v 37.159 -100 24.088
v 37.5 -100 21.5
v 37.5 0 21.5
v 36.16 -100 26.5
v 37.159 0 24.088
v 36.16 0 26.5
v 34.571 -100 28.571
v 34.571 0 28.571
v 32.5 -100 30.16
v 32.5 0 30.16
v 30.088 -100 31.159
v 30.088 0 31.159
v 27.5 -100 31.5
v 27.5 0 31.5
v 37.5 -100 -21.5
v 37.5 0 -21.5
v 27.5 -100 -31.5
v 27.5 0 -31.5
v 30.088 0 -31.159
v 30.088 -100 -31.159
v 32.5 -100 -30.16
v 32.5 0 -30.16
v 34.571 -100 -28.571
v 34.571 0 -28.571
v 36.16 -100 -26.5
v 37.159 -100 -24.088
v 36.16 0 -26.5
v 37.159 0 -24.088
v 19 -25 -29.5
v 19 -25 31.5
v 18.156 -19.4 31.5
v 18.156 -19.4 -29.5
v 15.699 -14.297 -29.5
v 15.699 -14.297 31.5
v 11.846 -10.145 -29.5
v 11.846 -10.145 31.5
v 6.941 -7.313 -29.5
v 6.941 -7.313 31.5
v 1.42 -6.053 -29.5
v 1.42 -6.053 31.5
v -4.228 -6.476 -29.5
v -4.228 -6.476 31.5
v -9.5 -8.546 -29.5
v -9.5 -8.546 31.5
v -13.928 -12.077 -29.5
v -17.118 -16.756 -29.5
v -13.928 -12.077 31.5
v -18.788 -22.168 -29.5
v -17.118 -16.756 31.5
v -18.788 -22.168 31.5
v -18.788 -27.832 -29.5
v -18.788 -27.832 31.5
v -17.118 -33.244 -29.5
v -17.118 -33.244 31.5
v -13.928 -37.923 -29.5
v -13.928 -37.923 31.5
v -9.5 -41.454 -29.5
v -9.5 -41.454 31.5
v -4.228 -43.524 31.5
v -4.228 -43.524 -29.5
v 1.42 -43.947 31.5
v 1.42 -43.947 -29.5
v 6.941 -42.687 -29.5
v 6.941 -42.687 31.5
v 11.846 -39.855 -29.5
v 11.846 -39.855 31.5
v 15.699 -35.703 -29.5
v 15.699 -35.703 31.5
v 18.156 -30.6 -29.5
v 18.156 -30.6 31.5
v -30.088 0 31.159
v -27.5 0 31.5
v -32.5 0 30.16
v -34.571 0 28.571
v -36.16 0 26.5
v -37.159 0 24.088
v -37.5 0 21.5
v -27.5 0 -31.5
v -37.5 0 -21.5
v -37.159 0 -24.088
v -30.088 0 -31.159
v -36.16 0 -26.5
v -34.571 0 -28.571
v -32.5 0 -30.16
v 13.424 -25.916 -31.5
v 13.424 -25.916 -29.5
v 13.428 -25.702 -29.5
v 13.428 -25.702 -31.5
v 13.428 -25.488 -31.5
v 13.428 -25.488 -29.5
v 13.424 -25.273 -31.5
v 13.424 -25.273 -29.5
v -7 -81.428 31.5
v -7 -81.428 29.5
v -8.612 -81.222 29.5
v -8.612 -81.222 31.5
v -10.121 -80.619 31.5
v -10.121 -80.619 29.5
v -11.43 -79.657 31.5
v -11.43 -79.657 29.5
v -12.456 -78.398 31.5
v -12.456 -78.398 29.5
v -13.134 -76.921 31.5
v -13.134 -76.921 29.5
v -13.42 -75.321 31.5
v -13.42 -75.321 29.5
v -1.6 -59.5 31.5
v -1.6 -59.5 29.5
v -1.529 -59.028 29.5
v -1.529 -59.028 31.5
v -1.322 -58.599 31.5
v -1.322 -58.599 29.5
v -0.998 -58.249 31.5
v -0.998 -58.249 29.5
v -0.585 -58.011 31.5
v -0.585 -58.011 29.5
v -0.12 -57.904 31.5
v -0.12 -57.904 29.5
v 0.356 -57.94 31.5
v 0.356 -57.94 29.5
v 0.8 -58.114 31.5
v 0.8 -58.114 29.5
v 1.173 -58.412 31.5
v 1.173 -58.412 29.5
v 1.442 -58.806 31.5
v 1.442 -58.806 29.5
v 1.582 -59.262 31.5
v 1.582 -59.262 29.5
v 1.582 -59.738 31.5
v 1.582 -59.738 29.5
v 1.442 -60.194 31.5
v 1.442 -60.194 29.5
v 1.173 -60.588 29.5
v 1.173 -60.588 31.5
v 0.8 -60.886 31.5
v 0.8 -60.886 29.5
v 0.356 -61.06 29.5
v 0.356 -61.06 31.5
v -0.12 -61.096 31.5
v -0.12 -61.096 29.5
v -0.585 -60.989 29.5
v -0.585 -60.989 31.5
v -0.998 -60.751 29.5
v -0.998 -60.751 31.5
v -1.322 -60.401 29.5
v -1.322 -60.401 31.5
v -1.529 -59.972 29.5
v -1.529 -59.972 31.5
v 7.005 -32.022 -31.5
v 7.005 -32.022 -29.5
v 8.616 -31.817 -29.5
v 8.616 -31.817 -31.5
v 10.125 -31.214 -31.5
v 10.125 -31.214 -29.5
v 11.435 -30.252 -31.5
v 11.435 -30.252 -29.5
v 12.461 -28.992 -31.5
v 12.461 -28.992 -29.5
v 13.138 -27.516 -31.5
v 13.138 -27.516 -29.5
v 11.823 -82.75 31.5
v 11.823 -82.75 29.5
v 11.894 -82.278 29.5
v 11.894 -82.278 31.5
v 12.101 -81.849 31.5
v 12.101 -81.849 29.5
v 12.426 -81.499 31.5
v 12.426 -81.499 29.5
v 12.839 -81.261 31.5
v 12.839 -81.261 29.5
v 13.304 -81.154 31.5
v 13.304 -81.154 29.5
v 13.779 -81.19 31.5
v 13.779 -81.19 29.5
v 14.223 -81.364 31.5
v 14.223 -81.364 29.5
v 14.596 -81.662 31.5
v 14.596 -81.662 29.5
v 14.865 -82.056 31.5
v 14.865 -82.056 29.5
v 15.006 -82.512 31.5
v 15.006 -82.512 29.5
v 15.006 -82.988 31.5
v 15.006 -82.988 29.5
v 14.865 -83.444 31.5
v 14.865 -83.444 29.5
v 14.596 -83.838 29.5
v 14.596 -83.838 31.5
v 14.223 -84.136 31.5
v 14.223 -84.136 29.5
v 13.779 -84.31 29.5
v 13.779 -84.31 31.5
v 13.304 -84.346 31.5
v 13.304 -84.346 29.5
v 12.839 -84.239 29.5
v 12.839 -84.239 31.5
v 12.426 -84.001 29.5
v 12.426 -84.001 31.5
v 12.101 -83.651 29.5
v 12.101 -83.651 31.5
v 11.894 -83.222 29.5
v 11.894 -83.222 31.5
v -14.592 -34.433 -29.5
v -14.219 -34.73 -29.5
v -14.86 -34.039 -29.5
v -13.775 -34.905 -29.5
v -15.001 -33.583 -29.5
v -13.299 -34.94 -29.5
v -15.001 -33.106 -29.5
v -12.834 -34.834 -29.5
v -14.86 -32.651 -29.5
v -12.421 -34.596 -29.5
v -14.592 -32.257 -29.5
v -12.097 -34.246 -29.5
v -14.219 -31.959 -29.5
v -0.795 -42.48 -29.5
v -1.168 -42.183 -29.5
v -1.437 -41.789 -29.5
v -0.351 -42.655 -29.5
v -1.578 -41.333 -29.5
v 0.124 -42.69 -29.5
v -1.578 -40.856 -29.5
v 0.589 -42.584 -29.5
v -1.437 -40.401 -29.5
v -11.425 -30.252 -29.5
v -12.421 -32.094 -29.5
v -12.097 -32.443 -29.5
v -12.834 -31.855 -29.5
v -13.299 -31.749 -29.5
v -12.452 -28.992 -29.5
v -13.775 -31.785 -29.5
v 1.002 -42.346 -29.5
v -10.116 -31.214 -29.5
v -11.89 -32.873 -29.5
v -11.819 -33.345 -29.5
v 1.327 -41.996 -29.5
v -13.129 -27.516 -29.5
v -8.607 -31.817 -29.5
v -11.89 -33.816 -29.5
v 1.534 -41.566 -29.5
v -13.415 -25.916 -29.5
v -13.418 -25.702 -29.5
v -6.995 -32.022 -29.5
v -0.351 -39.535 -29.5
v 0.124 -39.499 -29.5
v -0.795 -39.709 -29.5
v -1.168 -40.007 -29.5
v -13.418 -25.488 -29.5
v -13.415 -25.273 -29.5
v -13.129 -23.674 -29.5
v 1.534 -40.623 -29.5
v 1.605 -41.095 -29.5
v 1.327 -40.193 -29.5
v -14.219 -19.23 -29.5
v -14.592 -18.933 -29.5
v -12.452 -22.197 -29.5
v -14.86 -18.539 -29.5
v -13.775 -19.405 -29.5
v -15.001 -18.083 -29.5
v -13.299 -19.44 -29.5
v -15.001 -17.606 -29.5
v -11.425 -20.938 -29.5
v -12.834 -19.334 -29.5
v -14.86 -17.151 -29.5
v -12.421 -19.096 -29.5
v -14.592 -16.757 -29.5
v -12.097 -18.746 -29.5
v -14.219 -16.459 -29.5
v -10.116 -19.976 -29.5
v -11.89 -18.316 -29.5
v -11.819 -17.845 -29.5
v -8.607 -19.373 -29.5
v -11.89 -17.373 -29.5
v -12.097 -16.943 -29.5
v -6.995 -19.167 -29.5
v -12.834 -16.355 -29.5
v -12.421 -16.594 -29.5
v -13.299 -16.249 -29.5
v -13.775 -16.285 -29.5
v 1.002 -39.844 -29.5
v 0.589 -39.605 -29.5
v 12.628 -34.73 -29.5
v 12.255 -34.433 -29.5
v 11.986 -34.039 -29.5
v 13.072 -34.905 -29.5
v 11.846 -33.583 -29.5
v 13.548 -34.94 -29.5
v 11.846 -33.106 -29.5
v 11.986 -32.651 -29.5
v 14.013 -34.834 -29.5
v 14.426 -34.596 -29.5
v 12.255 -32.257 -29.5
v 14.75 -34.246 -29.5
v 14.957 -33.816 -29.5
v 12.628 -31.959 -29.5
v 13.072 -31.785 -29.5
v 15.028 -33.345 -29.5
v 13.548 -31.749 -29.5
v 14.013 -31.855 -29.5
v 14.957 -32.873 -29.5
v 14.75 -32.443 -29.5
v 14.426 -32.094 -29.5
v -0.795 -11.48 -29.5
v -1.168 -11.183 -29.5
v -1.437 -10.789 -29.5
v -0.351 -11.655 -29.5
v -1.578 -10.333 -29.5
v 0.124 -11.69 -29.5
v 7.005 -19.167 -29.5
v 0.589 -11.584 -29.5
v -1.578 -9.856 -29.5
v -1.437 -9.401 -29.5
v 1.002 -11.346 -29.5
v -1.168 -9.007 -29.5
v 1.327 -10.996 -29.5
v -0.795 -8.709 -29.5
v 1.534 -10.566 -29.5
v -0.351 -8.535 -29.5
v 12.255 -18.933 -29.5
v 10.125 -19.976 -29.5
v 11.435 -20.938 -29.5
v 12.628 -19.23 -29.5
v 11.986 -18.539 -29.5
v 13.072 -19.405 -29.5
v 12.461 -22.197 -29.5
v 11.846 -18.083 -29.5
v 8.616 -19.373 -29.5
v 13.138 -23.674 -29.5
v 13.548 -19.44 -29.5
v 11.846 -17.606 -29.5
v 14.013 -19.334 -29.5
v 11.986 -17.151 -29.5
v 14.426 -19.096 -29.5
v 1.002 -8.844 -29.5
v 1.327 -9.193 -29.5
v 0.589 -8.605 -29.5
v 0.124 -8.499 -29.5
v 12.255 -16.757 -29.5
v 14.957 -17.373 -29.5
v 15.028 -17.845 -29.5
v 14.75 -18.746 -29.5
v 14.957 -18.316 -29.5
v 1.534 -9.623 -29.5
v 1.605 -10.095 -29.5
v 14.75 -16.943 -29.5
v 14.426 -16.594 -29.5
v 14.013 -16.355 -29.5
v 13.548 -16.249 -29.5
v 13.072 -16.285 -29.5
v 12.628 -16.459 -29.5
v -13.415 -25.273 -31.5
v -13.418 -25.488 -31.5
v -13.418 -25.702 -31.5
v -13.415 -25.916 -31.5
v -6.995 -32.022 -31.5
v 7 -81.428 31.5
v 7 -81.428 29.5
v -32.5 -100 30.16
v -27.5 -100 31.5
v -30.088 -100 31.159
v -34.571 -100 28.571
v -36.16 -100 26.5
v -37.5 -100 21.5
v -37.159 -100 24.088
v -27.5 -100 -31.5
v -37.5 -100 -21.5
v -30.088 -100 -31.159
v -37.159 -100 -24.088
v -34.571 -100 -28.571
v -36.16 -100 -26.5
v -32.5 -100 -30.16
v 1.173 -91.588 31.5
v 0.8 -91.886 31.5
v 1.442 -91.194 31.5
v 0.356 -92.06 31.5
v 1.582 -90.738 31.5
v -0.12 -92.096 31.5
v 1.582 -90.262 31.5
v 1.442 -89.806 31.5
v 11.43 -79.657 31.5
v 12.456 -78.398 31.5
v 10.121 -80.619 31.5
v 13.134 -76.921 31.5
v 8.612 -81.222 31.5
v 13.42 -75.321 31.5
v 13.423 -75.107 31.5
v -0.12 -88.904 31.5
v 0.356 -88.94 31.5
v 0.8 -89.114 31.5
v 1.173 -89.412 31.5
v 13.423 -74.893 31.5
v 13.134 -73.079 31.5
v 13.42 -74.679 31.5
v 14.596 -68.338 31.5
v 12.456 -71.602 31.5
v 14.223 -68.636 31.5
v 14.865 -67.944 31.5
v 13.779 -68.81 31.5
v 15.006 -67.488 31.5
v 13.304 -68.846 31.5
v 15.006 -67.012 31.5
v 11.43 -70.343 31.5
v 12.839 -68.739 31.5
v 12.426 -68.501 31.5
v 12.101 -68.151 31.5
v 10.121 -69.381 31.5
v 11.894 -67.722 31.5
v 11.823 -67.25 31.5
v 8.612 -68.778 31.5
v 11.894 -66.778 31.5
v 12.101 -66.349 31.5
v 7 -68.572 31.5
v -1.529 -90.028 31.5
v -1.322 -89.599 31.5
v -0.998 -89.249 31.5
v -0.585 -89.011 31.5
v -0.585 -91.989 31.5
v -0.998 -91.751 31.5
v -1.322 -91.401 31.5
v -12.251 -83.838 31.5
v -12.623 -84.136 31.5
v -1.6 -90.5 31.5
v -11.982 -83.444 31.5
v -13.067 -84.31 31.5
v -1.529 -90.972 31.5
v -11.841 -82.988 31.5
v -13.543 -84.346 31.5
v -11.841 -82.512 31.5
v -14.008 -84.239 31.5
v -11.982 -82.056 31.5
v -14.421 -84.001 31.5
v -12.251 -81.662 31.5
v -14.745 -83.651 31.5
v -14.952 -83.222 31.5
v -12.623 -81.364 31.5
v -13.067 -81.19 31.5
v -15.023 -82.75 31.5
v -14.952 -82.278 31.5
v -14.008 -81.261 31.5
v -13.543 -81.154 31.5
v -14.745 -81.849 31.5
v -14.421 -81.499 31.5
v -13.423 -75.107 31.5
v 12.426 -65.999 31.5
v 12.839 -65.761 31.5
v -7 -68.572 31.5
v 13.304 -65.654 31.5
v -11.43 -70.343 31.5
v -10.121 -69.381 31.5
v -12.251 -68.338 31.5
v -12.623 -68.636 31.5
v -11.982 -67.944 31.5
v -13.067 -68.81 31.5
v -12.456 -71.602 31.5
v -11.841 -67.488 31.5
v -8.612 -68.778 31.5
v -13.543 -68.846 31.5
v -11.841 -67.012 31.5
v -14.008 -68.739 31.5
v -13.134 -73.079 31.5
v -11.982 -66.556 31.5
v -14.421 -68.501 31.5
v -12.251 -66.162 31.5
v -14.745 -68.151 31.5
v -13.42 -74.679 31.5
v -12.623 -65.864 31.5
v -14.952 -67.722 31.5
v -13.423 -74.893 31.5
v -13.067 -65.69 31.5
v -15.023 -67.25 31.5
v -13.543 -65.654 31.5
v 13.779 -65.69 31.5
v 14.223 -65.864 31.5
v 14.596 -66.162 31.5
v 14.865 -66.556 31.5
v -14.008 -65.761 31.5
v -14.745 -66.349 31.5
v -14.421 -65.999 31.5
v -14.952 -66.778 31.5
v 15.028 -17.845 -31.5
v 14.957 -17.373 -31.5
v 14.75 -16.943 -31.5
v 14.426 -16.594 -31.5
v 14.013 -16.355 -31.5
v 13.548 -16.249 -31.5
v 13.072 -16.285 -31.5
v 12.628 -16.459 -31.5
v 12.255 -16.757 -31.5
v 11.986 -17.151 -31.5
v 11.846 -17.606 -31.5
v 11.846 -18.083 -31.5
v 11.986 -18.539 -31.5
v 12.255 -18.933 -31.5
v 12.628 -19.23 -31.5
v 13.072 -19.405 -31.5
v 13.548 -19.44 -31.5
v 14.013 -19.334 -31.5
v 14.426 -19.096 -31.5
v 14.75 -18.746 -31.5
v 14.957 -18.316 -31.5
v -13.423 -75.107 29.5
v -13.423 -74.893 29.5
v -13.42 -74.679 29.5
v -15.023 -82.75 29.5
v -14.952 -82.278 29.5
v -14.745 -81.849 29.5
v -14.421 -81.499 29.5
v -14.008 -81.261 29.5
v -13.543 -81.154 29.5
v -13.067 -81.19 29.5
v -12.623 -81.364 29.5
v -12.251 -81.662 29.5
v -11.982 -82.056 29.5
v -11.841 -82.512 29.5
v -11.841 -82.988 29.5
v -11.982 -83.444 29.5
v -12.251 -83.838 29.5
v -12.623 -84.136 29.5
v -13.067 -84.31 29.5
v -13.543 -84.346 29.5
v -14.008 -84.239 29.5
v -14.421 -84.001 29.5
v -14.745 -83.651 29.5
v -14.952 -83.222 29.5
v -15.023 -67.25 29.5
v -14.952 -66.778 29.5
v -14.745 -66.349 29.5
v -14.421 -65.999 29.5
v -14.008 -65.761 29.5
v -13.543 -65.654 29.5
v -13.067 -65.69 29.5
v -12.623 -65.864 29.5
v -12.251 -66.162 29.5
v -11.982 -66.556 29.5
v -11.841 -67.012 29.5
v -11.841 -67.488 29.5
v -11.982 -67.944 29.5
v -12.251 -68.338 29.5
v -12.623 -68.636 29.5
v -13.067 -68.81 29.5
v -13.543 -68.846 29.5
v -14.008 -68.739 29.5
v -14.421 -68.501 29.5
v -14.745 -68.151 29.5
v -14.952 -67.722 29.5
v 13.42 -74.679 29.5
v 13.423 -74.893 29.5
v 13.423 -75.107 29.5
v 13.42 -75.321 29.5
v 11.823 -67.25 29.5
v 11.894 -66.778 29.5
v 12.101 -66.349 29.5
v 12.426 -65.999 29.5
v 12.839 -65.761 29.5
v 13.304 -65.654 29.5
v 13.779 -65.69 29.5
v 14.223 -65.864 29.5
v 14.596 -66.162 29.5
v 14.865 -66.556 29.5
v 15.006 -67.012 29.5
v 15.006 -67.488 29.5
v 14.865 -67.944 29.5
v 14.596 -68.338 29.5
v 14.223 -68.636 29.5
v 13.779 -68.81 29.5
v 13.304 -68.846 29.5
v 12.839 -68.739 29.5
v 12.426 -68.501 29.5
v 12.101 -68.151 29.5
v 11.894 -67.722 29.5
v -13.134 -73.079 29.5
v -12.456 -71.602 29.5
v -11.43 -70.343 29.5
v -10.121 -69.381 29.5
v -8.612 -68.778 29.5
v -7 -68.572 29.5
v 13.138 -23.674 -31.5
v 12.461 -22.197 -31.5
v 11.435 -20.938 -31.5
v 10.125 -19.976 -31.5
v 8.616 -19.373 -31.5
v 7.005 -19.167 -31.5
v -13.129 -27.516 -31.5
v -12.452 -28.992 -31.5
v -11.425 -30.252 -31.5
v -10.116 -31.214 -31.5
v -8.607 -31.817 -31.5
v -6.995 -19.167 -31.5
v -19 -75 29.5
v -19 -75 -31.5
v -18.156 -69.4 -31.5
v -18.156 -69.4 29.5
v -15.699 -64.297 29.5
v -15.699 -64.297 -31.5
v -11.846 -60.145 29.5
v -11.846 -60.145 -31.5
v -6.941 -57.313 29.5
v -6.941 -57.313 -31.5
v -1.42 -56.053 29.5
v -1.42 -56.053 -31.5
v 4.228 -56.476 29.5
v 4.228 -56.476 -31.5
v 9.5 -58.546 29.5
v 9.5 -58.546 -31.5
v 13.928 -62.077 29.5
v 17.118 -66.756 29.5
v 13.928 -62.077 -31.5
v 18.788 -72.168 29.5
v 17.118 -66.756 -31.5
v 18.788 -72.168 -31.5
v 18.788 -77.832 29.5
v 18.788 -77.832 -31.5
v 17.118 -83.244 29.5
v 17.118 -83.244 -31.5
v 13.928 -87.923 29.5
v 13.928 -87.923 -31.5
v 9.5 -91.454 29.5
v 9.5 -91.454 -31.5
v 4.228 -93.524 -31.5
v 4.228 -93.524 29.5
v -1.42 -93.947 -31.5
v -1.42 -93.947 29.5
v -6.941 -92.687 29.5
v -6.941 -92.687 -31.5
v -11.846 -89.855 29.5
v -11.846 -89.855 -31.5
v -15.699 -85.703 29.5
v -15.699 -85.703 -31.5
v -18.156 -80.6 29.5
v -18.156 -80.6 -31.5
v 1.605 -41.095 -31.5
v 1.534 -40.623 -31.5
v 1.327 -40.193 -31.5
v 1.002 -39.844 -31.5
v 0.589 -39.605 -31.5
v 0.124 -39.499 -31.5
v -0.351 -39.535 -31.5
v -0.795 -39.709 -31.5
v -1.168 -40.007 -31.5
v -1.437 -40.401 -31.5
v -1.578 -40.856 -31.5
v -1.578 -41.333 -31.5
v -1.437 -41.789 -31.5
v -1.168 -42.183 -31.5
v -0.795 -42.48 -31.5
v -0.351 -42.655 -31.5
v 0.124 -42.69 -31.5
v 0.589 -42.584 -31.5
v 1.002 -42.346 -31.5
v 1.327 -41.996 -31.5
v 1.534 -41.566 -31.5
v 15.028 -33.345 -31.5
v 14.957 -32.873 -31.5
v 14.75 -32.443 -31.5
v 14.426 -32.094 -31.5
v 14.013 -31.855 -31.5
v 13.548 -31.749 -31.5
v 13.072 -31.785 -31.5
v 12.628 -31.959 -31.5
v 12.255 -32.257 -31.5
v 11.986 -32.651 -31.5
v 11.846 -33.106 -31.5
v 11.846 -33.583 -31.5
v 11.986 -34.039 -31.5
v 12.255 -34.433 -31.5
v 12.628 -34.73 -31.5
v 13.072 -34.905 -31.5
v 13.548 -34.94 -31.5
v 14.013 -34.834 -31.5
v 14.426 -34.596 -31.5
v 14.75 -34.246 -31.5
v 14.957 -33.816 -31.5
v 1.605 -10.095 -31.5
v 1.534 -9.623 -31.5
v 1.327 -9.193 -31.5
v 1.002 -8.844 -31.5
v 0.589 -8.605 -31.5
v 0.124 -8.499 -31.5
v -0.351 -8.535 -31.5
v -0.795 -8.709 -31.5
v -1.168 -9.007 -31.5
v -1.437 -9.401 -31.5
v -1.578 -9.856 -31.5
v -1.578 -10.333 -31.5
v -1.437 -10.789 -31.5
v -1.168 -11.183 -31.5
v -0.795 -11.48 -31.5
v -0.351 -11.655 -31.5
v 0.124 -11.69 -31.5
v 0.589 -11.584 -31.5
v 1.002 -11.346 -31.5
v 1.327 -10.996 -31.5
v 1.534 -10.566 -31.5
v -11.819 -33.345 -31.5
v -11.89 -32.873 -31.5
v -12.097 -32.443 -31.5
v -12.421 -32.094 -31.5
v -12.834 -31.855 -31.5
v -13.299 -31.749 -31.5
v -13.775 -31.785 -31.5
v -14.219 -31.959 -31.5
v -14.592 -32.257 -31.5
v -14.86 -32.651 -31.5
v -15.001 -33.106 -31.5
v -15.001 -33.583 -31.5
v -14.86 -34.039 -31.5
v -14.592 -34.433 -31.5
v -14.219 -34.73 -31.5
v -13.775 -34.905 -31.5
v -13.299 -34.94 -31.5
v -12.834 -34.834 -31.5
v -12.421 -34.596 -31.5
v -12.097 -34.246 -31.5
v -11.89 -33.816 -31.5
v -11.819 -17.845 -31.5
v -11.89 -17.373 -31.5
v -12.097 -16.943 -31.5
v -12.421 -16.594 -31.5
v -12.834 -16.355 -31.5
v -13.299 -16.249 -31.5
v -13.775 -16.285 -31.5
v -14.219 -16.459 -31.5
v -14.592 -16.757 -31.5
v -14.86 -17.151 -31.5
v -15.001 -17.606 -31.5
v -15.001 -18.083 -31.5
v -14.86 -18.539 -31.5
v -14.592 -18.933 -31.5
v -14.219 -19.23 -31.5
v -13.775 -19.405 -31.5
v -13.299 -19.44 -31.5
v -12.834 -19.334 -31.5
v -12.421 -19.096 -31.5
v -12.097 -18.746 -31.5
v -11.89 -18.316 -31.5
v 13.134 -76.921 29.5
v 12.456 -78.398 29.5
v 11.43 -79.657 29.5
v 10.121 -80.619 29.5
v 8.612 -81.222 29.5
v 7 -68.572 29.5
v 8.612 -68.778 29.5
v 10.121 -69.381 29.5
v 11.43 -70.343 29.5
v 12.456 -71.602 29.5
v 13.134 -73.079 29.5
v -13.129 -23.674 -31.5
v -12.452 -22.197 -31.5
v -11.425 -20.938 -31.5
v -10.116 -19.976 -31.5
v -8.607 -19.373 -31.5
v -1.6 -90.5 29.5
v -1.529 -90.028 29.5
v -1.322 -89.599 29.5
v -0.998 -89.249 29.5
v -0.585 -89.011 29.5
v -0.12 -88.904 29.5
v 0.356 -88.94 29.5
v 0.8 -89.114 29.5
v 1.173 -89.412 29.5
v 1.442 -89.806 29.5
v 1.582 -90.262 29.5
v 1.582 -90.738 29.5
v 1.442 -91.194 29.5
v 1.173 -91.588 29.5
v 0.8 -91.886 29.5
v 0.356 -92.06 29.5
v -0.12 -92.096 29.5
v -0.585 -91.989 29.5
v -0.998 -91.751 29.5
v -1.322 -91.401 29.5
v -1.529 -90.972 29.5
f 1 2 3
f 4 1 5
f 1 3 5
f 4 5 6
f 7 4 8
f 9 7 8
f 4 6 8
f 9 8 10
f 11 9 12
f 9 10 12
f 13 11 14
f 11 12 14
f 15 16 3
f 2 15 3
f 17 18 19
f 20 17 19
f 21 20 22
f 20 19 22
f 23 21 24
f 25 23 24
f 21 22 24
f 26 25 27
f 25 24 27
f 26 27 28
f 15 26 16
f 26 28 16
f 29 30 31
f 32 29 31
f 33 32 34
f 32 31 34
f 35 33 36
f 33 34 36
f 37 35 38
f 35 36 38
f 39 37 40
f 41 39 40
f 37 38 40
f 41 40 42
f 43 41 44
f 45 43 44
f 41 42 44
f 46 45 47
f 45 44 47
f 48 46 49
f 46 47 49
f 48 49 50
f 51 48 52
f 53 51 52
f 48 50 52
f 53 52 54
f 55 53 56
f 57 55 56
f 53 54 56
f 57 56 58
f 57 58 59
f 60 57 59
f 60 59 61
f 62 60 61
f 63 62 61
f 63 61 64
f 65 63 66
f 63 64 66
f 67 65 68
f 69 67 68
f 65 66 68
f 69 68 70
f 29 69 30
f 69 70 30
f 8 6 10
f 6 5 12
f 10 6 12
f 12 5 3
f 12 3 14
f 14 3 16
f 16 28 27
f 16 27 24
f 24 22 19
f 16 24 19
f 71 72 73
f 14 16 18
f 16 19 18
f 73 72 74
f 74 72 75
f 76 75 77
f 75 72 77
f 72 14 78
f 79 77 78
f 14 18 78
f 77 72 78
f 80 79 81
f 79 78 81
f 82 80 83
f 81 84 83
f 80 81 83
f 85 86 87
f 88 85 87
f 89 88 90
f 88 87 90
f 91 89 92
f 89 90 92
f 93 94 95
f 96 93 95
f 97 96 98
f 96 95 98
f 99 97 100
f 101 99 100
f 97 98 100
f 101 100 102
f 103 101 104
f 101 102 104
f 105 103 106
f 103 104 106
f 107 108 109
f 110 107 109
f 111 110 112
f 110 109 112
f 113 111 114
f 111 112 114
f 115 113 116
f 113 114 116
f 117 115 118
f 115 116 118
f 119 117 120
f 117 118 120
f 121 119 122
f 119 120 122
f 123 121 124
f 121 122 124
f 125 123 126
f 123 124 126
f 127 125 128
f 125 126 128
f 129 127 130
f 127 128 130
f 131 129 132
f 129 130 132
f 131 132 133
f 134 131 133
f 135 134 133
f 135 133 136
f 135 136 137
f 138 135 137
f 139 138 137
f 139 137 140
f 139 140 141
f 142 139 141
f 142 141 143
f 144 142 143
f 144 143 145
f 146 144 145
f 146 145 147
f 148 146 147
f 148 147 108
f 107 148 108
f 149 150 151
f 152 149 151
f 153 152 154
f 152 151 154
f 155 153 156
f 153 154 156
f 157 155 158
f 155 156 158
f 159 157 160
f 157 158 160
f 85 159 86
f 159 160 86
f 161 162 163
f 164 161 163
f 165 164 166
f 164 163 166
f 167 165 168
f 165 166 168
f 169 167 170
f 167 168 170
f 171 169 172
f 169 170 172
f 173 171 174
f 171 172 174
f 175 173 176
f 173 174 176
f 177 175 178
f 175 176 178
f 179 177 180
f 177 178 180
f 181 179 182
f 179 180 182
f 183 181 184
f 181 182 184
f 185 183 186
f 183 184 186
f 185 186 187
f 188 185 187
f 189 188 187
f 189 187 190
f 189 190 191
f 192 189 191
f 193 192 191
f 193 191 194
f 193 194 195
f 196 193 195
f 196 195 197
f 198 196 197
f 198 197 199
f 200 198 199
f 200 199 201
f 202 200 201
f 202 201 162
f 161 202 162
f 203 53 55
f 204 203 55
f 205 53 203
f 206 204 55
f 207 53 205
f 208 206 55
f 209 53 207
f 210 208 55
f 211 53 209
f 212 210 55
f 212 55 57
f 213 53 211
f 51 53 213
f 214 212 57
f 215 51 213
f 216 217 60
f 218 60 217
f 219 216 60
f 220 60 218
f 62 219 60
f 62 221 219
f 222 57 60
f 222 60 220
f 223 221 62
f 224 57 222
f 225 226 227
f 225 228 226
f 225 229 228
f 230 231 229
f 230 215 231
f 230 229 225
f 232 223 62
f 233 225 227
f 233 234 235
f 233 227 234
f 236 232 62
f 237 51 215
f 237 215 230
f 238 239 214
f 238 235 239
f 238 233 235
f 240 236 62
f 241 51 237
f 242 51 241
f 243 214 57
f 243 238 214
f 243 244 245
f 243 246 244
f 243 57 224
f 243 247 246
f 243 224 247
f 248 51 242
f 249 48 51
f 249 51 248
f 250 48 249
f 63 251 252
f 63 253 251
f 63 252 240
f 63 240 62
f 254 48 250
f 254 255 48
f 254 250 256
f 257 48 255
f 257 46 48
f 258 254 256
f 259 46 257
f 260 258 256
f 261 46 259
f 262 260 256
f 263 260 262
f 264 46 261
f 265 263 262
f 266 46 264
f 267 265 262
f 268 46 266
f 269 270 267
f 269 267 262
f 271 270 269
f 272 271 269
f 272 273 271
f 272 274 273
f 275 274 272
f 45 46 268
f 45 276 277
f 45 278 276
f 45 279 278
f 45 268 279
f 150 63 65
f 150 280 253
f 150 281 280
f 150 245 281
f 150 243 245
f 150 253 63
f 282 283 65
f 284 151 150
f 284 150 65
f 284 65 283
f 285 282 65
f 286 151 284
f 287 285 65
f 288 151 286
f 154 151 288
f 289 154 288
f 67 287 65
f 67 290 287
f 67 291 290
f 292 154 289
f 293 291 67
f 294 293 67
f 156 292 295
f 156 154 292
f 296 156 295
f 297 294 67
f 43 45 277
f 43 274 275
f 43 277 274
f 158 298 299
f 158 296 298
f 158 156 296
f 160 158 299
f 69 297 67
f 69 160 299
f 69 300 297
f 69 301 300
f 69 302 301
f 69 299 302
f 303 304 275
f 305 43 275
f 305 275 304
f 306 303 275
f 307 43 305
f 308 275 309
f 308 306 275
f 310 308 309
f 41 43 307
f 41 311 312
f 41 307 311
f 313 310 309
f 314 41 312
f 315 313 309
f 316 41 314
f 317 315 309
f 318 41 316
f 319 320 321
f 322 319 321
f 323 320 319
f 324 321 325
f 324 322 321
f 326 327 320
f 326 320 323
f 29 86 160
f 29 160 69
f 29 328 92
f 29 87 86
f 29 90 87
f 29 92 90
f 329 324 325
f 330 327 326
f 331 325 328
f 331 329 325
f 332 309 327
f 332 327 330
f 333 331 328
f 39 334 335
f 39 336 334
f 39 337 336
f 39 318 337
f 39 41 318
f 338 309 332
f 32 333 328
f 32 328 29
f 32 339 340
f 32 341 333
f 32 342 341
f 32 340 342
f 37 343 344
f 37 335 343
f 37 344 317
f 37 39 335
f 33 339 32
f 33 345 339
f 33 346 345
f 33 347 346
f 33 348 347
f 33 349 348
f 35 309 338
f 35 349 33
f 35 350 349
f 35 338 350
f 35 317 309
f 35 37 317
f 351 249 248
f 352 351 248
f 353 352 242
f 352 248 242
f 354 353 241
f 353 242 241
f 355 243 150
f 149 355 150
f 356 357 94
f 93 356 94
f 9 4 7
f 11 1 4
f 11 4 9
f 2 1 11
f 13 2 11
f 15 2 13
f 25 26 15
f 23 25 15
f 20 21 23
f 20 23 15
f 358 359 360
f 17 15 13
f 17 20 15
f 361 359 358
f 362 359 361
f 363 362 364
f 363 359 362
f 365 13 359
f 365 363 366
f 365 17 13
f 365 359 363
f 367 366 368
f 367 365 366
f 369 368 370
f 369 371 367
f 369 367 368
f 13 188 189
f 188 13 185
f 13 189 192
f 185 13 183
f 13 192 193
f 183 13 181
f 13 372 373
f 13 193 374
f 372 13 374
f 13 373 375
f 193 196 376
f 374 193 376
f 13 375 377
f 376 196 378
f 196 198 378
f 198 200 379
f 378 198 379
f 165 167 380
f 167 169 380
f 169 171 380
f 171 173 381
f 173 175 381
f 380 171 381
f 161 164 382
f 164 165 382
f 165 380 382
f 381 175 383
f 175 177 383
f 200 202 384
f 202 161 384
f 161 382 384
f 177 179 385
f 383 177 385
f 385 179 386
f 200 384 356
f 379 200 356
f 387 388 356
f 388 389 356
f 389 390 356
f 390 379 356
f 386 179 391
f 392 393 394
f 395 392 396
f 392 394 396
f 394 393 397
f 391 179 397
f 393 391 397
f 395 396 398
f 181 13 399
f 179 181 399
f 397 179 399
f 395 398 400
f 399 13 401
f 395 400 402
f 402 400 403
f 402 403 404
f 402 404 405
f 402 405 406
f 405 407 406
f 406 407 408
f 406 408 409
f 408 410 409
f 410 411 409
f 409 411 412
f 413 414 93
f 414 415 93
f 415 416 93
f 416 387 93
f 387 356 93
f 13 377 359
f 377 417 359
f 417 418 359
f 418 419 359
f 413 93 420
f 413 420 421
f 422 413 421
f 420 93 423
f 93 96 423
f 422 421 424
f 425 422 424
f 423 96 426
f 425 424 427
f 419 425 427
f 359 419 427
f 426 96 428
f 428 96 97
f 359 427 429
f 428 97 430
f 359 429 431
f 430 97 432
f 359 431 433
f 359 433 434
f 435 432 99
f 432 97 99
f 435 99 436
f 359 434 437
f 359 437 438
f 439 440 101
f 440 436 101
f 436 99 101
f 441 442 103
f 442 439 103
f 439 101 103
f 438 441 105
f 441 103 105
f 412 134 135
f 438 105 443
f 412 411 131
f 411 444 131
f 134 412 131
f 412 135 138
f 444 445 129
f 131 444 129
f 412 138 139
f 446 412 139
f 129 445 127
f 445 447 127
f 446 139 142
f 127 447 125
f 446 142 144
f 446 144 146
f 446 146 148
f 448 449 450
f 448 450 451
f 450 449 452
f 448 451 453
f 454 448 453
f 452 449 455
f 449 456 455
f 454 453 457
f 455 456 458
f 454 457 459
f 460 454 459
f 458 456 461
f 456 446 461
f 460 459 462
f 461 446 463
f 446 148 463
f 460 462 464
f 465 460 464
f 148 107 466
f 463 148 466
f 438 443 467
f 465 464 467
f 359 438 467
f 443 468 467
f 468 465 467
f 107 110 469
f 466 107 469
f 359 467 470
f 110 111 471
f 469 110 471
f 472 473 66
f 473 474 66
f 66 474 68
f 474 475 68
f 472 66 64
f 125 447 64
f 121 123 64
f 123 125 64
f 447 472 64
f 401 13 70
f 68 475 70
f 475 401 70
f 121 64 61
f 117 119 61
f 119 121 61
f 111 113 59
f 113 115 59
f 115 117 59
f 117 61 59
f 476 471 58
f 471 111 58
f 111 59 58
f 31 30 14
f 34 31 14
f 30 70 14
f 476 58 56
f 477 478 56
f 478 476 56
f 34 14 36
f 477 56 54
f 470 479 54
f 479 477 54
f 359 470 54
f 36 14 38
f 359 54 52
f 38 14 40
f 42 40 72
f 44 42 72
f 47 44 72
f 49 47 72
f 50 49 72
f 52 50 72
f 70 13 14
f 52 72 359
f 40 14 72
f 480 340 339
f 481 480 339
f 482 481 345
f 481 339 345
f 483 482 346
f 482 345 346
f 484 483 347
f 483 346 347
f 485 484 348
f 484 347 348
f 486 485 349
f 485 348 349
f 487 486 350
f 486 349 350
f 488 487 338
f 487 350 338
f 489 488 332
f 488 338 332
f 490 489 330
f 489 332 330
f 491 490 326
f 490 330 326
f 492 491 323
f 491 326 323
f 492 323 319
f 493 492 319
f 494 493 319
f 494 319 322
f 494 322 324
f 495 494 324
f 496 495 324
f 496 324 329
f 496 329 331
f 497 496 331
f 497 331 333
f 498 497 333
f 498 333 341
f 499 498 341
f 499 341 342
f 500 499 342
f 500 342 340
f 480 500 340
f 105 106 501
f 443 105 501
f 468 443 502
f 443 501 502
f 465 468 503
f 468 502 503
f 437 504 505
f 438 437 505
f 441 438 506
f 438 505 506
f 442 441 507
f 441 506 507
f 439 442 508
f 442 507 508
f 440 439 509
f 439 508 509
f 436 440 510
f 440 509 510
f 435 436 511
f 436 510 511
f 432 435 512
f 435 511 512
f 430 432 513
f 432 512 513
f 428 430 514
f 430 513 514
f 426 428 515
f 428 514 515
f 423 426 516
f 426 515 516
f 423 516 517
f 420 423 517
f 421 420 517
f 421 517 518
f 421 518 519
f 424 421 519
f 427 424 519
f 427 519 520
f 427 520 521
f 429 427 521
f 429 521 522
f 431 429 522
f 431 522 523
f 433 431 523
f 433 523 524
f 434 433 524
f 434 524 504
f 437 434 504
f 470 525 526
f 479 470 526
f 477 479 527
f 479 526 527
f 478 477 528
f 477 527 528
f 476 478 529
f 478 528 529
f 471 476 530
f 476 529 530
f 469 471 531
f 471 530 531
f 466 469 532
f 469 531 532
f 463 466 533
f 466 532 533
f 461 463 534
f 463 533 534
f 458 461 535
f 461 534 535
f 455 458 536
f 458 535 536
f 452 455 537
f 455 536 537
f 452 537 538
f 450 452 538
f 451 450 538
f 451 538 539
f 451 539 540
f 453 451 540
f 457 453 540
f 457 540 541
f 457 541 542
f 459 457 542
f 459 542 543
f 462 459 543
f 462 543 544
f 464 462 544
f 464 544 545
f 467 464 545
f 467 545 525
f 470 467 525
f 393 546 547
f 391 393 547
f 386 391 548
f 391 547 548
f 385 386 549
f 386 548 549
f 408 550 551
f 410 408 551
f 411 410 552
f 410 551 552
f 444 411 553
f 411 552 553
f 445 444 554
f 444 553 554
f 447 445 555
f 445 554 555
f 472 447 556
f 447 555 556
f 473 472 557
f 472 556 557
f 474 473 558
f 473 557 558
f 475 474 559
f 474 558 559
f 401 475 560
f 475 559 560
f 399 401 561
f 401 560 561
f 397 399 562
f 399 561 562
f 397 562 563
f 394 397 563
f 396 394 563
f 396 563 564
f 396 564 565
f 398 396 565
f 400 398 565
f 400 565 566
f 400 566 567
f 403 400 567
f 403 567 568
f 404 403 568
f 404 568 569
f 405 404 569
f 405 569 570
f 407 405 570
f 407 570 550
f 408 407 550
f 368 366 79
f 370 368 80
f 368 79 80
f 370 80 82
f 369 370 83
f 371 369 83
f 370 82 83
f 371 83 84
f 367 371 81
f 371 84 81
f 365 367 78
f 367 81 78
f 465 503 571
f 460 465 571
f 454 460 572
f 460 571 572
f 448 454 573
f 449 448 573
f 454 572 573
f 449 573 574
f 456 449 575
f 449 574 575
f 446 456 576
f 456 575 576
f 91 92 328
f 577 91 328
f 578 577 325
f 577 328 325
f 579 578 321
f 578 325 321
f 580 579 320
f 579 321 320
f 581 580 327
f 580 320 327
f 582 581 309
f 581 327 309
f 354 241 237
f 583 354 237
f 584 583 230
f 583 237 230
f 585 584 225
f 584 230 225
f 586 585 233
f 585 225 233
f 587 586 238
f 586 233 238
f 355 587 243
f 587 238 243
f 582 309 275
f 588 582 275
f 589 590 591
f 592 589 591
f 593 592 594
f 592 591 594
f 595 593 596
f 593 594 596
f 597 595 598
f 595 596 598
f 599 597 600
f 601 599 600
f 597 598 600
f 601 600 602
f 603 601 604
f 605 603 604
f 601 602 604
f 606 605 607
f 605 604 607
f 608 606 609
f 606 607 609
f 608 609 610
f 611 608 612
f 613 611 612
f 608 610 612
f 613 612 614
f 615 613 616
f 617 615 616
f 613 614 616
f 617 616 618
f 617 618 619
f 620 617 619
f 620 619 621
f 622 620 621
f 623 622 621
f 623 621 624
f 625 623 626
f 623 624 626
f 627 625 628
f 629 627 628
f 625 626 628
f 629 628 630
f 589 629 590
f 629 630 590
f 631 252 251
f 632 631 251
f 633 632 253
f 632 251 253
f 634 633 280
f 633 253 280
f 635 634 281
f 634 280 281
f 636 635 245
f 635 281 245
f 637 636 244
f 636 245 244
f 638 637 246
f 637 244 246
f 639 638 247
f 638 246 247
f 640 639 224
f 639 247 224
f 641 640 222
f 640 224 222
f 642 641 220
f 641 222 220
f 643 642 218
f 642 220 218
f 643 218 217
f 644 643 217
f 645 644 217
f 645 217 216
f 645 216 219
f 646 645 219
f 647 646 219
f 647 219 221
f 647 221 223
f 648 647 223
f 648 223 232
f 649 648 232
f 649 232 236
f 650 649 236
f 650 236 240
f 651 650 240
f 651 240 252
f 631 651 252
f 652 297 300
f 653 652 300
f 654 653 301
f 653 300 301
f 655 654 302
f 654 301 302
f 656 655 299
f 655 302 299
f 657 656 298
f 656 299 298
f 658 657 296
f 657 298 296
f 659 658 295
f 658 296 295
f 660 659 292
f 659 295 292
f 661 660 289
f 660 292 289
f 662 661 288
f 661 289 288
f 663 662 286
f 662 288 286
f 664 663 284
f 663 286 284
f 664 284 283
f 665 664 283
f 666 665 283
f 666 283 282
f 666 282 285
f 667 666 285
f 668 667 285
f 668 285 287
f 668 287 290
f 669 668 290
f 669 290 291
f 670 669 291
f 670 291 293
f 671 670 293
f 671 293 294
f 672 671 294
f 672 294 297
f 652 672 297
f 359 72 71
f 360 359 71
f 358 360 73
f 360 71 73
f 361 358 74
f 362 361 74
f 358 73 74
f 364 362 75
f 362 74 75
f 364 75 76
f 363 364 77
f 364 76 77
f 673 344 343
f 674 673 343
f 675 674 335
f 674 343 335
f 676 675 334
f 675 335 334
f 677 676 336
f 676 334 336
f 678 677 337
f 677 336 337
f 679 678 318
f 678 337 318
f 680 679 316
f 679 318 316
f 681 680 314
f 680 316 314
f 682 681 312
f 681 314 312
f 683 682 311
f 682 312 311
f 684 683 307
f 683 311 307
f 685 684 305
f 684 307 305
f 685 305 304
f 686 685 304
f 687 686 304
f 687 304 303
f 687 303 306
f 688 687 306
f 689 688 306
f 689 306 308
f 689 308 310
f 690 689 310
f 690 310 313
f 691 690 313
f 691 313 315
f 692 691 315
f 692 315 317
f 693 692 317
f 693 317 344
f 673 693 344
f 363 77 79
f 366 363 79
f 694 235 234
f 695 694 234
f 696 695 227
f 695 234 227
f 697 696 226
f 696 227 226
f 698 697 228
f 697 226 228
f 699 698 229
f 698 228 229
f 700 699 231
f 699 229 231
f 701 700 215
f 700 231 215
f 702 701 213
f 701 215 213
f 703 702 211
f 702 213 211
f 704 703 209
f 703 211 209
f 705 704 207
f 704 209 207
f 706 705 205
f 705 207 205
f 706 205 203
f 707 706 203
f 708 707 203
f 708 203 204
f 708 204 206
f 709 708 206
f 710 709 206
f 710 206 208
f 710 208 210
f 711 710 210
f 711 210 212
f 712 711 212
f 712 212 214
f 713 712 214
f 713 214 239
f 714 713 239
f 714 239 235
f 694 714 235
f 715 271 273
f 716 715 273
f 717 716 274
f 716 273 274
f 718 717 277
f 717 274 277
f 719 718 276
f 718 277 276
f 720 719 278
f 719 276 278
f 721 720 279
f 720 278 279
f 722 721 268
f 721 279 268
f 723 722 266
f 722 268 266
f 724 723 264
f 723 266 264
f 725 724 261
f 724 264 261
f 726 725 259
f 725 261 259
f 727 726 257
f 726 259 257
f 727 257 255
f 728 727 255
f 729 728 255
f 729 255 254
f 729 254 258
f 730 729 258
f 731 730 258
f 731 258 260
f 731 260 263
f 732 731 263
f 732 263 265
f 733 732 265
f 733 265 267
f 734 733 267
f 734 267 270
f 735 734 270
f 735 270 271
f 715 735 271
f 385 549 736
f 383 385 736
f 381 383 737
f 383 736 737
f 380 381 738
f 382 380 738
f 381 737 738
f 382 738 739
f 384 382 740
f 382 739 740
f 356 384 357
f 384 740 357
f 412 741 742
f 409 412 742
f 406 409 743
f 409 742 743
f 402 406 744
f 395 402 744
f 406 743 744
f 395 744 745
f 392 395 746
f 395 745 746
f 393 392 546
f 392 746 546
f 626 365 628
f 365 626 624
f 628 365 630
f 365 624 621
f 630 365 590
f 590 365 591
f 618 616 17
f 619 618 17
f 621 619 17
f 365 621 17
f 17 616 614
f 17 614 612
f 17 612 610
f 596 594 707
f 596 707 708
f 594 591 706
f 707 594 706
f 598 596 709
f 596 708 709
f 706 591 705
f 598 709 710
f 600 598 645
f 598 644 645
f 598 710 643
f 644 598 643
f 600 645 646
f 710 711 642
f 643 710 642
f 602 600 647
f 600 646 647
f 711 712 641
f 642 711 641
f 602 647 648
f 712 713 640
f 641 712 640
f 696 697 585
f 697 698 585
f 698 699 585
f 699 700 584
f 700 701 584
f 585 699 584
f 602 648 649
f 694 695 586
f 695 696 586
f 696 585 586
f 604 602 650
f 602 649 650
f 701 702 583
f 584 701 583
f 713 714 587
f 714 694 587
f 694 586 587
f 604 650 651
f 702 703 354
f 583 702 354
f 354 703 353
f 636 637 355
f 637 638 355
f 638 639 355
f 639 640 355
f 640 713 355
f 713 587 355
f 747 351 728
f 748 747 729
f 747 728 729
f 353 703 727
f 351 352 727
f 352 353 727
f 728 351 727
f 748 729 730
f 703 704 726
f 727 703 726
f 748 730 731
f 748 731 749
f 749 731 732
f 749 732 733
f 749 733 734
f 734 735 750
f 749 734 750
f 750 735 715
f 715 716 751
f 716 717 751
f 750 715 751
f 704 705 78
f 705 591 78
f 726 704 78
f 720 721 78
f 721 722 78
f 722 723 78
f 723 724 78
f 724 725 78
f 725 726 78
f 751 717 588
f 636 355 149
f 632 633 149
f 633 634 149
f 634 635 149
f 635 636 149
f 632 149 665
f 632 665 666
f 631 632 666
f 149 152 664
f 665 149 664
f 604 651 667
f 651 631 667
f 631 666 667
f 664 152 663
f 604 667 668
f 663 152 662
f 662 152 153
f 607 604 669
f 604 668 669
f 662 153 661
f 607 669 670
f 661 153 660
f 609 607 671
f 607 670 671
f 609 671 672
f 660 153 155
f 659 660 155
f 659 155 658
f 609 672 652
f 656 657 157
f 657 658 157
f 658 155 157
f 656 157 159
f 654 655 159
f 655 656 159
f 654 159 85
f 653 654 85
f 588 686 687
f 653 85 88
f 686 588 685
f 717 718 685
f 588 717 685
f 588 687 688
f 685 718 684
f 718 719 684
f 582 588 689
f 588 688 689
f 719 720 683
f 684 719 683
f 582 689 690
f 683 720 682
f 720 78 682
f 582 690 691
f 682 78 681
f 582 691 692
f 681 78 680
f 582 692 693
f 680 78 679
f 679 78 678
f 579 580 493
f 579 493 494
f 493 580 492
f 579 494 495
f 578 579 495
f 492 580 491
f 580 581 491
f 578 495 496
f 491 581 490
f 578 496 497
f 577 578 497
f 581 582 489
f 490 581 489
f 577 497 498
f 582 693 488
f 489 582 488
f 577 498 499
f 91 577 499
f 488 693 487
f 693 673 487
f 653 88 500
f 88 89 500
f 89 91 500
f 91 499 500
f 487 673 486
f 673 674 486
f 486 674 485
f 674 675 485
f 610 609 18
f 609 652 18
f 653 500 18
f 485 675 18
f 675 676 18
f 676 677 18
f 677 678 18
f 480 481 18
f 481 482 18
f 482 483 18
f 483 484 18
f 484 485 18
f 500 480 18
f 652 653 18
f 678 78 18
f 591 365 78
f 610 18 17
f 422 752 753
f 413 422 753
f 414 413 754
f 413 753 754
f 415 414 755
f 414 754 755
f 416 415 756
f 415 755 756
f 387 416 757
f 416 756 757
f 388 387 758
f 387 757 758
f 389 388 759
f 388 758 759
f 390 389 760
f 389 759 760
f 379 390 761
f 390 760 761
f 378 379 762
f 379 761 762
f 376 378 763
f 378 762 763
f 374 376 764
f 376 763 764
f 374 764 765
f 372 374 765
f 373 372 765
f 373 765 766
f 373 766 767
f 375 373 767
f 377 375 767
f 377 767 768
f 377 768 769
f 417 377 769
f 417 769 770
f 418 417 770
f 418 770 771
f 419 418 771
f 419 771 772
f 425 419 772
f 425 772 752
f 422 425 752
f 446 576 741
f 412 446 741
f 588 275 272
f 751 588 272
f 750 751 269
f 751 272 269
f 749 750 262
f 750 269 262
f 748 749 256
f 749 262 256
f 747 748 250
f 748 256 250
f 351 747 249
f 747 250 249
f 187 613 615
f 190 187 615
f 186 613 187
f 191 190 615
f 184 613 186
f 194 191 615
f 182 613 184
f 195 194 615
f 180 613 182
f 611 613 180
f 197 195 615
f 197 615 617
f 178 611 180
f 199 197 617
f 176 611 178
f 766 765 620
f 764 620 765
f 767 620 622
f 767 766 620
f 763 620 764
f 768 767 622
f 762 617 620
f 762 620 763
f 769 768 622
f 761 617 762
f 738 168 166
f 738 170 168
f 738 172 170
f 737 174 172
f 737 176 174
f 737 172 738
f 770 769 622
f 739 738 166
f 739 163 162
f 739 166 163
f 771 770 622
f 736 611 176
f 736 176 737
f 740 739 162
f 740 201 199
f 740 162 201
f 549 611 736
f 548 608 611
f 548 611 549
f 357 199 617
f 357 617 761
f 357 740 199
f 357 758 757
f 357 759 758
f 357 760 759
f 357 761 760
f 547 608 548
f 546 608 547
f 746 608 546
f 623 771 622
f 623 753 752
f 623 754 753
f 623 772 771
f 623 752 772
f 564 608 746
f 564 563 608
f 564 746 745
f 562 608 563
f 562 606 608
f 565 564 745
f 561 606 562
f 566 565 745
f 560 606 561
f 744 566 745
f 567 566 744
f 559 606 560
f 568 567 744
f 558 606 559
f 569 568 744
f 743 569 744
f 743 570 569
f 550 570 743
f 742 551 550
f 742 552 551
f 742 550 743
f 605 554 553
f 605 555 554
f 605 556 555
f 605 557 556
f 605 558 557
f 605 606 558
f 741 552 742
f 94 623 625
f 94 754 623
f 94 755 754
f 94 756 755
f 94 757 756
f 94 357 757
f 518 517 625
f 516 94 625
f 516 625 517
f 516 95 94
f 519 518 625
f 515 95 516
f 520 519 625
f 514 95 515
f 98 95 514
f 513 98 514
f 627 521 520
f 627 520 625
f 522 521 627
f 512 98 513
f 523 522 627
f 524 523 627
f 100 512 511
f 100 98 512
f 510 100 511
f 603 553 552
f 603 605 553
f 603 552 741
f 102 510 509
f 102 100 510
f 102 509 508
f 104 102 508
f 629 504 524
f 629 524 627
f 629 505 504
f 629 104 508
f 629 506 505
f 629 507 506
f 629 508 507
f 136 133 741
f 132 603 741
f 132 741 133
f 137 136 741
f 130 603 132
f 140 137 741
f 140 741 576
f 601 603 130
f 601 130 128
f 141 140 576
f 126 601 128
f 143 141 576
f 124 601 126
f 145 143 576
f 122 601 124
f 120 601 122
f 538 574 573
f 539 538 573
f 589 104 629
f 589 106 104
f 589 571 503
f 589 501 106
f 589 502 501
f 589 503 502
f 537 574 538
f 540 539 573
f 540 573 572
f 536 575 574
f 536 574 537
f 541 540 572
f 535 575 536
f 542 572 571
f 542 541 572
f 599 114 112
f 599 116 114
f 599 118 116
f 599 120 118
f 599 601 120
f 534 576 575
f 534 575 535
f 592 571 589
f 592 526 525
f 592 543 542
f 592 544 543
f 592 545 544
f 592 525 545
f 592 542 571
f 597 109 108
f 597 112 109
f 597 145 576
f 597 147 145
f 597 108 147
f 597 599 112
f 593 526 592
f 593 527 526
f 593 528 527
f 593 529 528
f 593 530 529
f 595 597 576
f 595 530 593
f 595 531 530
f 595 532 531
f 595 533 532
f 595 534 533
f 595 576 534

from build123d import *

# Parameters (mm, degrees)
EXTRUDE_1_DEPTH      = 100
SKETCH_4_R           = 1.6
CUT_EXTRUDE_7_DEPTH  = 124.99697577
SKETCH_7_R           = 19
CUT_EXTRUDE_8_DEPTH  = 61
SKETCH_3_R           = 1.6
CUT_EXTRUDE_9_DEPTH  = 124.99697577
SKETCH_5_R           = 19
CUT_EXTRUDE_10_DEPTH = 61


with BuildPart() as part:
    # 草图1 → 凸台-拉伸1 (new body)
    with BuildSketch(Plane(origin=(0, 0, 0), x_dir=(1, 0, 0), z_dir=(0, 1, 0))):
        with BuildLine():
            Line((-27.5, 31.5), (27.5, 31.5))
            ThreePointArc((27.5, 31.5), (34.571067812, 28.571067812), (37.5, 21.5))
            Line((37.5, 21.5), (37.5, -21.5))
            ThreePointArc((37.5, -21.5), (34.571067812, -28.571067812), (27.5, -31.5))
            Line((27.5, -31.5), (-27.5, -31.5))
            ThreePointArc((-27.5, -31.5), (-34.571067812, -28.571067812), (-37.5, -21.5))
            Line((-37.5, -21.5), (-37.5, 21.5))
            ThreePointArc((-37.5, 21.5), (-34.571067812, 28.571067812), (-27.5, 31.5))
        make_face()
    extrude(amount=-EXTRUDE_1_DEPTH)

    # 草图4 → 切除-拉伸7 (cut, through all)
    with BuildSketch(Plane(origin=(0, 0, -31.5), x_dir=(-1, 0, 0), z_dir=(0, 0, -1))):
        with Locations((0, -90.500000002)):
            Circle(SKETCH_4_R)
        with Locations((13.42339376, -82.750000001)):
            Circle(SKETCH_4_R)
        with BuildLine():
            ThreePointArc((7, -81.427584506), (11.429921133, -79.657213904), (13.419546961, -75.321340016))
            ThreePointArc((13.419546961, -75.321340016), (13.42339376, -75), (13.419546961, -74.678659984))
            ThreePointArc((13.419546961, -74.678659984), (11.429921133, -70.342786096), (7, -68.572415494))
            Line((7, -68.572415494), (-7, -68.572415494))
            ThreePointArc((-7, -68.572415494), (-11.429921133, -70.342786096), (-13.419546961, -74.678659984))
            ThreePointArc((-13.419546961, -74.678659984), (-13.42339376, -75), (-13.419546961, -75.321340016))
            ThreePointArc((-13.419546961, -75.321340016), (-11.429921133, -79.657213904), (-7, -81.427584506))
            Line((-7, -81.427584506), (7, -81.427584506))
        make_face()
        with Locations((-13.42339376, -82.750000001)):
            Circle(SKETCH_4_R)
        with Locations((13.42339376, -67.249999999)):
            Circle(SKETCH_4_R)
        with Locations((-13.42339376, -67.249999999)):
            Circle(SKETCH_4_R)
        with Locations((0, -59.499999998)):
            Circle(SKETCH_4_R)
    extrude(amount=-CUT_EXTRUDE_7_DEPTH, mode=Mode.SUBTRACT)

    # 草图7 → 切除-拉伸8 (cut)
    with BuildSketch(Plane(origin=(0, 0, -31.5), x_dir=(-1, 0, 0), z_dir=(0, 0, -1))):
        with Locations((0, -75)):
            Circle(SKETCH_7_R)
    extrude(amount=-CUT_EXTRUDE_8_DEPTH, mode=Mode.SUBTRACT)

    # 草图3 → 切除-拉伸9 (cut, through all)
    with BuildSketch(Plane.XY.offset(31.5)):
        with Locations((0.004610011, -41.094795393)):
            Circle(SKETCH_3_R)
        with Locations((13.428003771, -33.344795392)):
            Circle(SKETCH_3_R)
        with BuildLine():
            ThreePointArc((7.004610011, -32.022379898), (11.434531144, -30.252009295), (13.424156972, -25.916135407))
            ThreePointArc((13.424156972, -25.916135407), (13.428003771, -25.594795392), (13.424156972, -25.273455376))
            ThreePointArc((13.424156972, -25.273455376), (11.434531144, -20.937581488), (7.004610011, -19.167210885))
            Line((7.004610011, -19.167210885), (-6.995389989, -19.167210885))
            ThreePointArc((-6.995389989, -19.167210885), (-11.425311121, -20.937581488), (-13.414936949, -25.273455376))
            ThreePointArc((-13.414936949, -25.273455376), (-13.418783749, -25.594795392), (-13.414936949, -25.916135407))
            ThreePointArc((-13.414936949, -25.916135407), (-11.425311121, -30.252009295), (-6.995389989, -32.022379898))
            Line((-6.995389989, -32.022379898), (7.004610011, -32.022379898))
        make_face()
        with Locations((-13.418783749, -33.344795392)):
            Circle(SKETCH_3_R)
        with Locations((13.428003771, -17.844795391)):
            Circle(SKETCH_3_R)
        with Locations((-13.418783749, -17.844795391)):
            Circle(SKETCH_3_R)
        with Locations((0.004610011, -10.09479539)):
            Circle(SKETCH_3_R)
    extrude(amount=-CUT_EXTRUDE_9_DEPTH, mode=Mode.SUBTRACT)

    # 草图5 → 切除-拉伸10 (cut)
    with BuildSketch(Plane.XY.offset(31.5)):
        with Locations((0, -25)):
            Circle(SKETCH_5_R)
    extrude(amount=-CUT_EXTRUDE_10_DEPTH, mode=Mode.SUBTRACT)


solid = part.part
